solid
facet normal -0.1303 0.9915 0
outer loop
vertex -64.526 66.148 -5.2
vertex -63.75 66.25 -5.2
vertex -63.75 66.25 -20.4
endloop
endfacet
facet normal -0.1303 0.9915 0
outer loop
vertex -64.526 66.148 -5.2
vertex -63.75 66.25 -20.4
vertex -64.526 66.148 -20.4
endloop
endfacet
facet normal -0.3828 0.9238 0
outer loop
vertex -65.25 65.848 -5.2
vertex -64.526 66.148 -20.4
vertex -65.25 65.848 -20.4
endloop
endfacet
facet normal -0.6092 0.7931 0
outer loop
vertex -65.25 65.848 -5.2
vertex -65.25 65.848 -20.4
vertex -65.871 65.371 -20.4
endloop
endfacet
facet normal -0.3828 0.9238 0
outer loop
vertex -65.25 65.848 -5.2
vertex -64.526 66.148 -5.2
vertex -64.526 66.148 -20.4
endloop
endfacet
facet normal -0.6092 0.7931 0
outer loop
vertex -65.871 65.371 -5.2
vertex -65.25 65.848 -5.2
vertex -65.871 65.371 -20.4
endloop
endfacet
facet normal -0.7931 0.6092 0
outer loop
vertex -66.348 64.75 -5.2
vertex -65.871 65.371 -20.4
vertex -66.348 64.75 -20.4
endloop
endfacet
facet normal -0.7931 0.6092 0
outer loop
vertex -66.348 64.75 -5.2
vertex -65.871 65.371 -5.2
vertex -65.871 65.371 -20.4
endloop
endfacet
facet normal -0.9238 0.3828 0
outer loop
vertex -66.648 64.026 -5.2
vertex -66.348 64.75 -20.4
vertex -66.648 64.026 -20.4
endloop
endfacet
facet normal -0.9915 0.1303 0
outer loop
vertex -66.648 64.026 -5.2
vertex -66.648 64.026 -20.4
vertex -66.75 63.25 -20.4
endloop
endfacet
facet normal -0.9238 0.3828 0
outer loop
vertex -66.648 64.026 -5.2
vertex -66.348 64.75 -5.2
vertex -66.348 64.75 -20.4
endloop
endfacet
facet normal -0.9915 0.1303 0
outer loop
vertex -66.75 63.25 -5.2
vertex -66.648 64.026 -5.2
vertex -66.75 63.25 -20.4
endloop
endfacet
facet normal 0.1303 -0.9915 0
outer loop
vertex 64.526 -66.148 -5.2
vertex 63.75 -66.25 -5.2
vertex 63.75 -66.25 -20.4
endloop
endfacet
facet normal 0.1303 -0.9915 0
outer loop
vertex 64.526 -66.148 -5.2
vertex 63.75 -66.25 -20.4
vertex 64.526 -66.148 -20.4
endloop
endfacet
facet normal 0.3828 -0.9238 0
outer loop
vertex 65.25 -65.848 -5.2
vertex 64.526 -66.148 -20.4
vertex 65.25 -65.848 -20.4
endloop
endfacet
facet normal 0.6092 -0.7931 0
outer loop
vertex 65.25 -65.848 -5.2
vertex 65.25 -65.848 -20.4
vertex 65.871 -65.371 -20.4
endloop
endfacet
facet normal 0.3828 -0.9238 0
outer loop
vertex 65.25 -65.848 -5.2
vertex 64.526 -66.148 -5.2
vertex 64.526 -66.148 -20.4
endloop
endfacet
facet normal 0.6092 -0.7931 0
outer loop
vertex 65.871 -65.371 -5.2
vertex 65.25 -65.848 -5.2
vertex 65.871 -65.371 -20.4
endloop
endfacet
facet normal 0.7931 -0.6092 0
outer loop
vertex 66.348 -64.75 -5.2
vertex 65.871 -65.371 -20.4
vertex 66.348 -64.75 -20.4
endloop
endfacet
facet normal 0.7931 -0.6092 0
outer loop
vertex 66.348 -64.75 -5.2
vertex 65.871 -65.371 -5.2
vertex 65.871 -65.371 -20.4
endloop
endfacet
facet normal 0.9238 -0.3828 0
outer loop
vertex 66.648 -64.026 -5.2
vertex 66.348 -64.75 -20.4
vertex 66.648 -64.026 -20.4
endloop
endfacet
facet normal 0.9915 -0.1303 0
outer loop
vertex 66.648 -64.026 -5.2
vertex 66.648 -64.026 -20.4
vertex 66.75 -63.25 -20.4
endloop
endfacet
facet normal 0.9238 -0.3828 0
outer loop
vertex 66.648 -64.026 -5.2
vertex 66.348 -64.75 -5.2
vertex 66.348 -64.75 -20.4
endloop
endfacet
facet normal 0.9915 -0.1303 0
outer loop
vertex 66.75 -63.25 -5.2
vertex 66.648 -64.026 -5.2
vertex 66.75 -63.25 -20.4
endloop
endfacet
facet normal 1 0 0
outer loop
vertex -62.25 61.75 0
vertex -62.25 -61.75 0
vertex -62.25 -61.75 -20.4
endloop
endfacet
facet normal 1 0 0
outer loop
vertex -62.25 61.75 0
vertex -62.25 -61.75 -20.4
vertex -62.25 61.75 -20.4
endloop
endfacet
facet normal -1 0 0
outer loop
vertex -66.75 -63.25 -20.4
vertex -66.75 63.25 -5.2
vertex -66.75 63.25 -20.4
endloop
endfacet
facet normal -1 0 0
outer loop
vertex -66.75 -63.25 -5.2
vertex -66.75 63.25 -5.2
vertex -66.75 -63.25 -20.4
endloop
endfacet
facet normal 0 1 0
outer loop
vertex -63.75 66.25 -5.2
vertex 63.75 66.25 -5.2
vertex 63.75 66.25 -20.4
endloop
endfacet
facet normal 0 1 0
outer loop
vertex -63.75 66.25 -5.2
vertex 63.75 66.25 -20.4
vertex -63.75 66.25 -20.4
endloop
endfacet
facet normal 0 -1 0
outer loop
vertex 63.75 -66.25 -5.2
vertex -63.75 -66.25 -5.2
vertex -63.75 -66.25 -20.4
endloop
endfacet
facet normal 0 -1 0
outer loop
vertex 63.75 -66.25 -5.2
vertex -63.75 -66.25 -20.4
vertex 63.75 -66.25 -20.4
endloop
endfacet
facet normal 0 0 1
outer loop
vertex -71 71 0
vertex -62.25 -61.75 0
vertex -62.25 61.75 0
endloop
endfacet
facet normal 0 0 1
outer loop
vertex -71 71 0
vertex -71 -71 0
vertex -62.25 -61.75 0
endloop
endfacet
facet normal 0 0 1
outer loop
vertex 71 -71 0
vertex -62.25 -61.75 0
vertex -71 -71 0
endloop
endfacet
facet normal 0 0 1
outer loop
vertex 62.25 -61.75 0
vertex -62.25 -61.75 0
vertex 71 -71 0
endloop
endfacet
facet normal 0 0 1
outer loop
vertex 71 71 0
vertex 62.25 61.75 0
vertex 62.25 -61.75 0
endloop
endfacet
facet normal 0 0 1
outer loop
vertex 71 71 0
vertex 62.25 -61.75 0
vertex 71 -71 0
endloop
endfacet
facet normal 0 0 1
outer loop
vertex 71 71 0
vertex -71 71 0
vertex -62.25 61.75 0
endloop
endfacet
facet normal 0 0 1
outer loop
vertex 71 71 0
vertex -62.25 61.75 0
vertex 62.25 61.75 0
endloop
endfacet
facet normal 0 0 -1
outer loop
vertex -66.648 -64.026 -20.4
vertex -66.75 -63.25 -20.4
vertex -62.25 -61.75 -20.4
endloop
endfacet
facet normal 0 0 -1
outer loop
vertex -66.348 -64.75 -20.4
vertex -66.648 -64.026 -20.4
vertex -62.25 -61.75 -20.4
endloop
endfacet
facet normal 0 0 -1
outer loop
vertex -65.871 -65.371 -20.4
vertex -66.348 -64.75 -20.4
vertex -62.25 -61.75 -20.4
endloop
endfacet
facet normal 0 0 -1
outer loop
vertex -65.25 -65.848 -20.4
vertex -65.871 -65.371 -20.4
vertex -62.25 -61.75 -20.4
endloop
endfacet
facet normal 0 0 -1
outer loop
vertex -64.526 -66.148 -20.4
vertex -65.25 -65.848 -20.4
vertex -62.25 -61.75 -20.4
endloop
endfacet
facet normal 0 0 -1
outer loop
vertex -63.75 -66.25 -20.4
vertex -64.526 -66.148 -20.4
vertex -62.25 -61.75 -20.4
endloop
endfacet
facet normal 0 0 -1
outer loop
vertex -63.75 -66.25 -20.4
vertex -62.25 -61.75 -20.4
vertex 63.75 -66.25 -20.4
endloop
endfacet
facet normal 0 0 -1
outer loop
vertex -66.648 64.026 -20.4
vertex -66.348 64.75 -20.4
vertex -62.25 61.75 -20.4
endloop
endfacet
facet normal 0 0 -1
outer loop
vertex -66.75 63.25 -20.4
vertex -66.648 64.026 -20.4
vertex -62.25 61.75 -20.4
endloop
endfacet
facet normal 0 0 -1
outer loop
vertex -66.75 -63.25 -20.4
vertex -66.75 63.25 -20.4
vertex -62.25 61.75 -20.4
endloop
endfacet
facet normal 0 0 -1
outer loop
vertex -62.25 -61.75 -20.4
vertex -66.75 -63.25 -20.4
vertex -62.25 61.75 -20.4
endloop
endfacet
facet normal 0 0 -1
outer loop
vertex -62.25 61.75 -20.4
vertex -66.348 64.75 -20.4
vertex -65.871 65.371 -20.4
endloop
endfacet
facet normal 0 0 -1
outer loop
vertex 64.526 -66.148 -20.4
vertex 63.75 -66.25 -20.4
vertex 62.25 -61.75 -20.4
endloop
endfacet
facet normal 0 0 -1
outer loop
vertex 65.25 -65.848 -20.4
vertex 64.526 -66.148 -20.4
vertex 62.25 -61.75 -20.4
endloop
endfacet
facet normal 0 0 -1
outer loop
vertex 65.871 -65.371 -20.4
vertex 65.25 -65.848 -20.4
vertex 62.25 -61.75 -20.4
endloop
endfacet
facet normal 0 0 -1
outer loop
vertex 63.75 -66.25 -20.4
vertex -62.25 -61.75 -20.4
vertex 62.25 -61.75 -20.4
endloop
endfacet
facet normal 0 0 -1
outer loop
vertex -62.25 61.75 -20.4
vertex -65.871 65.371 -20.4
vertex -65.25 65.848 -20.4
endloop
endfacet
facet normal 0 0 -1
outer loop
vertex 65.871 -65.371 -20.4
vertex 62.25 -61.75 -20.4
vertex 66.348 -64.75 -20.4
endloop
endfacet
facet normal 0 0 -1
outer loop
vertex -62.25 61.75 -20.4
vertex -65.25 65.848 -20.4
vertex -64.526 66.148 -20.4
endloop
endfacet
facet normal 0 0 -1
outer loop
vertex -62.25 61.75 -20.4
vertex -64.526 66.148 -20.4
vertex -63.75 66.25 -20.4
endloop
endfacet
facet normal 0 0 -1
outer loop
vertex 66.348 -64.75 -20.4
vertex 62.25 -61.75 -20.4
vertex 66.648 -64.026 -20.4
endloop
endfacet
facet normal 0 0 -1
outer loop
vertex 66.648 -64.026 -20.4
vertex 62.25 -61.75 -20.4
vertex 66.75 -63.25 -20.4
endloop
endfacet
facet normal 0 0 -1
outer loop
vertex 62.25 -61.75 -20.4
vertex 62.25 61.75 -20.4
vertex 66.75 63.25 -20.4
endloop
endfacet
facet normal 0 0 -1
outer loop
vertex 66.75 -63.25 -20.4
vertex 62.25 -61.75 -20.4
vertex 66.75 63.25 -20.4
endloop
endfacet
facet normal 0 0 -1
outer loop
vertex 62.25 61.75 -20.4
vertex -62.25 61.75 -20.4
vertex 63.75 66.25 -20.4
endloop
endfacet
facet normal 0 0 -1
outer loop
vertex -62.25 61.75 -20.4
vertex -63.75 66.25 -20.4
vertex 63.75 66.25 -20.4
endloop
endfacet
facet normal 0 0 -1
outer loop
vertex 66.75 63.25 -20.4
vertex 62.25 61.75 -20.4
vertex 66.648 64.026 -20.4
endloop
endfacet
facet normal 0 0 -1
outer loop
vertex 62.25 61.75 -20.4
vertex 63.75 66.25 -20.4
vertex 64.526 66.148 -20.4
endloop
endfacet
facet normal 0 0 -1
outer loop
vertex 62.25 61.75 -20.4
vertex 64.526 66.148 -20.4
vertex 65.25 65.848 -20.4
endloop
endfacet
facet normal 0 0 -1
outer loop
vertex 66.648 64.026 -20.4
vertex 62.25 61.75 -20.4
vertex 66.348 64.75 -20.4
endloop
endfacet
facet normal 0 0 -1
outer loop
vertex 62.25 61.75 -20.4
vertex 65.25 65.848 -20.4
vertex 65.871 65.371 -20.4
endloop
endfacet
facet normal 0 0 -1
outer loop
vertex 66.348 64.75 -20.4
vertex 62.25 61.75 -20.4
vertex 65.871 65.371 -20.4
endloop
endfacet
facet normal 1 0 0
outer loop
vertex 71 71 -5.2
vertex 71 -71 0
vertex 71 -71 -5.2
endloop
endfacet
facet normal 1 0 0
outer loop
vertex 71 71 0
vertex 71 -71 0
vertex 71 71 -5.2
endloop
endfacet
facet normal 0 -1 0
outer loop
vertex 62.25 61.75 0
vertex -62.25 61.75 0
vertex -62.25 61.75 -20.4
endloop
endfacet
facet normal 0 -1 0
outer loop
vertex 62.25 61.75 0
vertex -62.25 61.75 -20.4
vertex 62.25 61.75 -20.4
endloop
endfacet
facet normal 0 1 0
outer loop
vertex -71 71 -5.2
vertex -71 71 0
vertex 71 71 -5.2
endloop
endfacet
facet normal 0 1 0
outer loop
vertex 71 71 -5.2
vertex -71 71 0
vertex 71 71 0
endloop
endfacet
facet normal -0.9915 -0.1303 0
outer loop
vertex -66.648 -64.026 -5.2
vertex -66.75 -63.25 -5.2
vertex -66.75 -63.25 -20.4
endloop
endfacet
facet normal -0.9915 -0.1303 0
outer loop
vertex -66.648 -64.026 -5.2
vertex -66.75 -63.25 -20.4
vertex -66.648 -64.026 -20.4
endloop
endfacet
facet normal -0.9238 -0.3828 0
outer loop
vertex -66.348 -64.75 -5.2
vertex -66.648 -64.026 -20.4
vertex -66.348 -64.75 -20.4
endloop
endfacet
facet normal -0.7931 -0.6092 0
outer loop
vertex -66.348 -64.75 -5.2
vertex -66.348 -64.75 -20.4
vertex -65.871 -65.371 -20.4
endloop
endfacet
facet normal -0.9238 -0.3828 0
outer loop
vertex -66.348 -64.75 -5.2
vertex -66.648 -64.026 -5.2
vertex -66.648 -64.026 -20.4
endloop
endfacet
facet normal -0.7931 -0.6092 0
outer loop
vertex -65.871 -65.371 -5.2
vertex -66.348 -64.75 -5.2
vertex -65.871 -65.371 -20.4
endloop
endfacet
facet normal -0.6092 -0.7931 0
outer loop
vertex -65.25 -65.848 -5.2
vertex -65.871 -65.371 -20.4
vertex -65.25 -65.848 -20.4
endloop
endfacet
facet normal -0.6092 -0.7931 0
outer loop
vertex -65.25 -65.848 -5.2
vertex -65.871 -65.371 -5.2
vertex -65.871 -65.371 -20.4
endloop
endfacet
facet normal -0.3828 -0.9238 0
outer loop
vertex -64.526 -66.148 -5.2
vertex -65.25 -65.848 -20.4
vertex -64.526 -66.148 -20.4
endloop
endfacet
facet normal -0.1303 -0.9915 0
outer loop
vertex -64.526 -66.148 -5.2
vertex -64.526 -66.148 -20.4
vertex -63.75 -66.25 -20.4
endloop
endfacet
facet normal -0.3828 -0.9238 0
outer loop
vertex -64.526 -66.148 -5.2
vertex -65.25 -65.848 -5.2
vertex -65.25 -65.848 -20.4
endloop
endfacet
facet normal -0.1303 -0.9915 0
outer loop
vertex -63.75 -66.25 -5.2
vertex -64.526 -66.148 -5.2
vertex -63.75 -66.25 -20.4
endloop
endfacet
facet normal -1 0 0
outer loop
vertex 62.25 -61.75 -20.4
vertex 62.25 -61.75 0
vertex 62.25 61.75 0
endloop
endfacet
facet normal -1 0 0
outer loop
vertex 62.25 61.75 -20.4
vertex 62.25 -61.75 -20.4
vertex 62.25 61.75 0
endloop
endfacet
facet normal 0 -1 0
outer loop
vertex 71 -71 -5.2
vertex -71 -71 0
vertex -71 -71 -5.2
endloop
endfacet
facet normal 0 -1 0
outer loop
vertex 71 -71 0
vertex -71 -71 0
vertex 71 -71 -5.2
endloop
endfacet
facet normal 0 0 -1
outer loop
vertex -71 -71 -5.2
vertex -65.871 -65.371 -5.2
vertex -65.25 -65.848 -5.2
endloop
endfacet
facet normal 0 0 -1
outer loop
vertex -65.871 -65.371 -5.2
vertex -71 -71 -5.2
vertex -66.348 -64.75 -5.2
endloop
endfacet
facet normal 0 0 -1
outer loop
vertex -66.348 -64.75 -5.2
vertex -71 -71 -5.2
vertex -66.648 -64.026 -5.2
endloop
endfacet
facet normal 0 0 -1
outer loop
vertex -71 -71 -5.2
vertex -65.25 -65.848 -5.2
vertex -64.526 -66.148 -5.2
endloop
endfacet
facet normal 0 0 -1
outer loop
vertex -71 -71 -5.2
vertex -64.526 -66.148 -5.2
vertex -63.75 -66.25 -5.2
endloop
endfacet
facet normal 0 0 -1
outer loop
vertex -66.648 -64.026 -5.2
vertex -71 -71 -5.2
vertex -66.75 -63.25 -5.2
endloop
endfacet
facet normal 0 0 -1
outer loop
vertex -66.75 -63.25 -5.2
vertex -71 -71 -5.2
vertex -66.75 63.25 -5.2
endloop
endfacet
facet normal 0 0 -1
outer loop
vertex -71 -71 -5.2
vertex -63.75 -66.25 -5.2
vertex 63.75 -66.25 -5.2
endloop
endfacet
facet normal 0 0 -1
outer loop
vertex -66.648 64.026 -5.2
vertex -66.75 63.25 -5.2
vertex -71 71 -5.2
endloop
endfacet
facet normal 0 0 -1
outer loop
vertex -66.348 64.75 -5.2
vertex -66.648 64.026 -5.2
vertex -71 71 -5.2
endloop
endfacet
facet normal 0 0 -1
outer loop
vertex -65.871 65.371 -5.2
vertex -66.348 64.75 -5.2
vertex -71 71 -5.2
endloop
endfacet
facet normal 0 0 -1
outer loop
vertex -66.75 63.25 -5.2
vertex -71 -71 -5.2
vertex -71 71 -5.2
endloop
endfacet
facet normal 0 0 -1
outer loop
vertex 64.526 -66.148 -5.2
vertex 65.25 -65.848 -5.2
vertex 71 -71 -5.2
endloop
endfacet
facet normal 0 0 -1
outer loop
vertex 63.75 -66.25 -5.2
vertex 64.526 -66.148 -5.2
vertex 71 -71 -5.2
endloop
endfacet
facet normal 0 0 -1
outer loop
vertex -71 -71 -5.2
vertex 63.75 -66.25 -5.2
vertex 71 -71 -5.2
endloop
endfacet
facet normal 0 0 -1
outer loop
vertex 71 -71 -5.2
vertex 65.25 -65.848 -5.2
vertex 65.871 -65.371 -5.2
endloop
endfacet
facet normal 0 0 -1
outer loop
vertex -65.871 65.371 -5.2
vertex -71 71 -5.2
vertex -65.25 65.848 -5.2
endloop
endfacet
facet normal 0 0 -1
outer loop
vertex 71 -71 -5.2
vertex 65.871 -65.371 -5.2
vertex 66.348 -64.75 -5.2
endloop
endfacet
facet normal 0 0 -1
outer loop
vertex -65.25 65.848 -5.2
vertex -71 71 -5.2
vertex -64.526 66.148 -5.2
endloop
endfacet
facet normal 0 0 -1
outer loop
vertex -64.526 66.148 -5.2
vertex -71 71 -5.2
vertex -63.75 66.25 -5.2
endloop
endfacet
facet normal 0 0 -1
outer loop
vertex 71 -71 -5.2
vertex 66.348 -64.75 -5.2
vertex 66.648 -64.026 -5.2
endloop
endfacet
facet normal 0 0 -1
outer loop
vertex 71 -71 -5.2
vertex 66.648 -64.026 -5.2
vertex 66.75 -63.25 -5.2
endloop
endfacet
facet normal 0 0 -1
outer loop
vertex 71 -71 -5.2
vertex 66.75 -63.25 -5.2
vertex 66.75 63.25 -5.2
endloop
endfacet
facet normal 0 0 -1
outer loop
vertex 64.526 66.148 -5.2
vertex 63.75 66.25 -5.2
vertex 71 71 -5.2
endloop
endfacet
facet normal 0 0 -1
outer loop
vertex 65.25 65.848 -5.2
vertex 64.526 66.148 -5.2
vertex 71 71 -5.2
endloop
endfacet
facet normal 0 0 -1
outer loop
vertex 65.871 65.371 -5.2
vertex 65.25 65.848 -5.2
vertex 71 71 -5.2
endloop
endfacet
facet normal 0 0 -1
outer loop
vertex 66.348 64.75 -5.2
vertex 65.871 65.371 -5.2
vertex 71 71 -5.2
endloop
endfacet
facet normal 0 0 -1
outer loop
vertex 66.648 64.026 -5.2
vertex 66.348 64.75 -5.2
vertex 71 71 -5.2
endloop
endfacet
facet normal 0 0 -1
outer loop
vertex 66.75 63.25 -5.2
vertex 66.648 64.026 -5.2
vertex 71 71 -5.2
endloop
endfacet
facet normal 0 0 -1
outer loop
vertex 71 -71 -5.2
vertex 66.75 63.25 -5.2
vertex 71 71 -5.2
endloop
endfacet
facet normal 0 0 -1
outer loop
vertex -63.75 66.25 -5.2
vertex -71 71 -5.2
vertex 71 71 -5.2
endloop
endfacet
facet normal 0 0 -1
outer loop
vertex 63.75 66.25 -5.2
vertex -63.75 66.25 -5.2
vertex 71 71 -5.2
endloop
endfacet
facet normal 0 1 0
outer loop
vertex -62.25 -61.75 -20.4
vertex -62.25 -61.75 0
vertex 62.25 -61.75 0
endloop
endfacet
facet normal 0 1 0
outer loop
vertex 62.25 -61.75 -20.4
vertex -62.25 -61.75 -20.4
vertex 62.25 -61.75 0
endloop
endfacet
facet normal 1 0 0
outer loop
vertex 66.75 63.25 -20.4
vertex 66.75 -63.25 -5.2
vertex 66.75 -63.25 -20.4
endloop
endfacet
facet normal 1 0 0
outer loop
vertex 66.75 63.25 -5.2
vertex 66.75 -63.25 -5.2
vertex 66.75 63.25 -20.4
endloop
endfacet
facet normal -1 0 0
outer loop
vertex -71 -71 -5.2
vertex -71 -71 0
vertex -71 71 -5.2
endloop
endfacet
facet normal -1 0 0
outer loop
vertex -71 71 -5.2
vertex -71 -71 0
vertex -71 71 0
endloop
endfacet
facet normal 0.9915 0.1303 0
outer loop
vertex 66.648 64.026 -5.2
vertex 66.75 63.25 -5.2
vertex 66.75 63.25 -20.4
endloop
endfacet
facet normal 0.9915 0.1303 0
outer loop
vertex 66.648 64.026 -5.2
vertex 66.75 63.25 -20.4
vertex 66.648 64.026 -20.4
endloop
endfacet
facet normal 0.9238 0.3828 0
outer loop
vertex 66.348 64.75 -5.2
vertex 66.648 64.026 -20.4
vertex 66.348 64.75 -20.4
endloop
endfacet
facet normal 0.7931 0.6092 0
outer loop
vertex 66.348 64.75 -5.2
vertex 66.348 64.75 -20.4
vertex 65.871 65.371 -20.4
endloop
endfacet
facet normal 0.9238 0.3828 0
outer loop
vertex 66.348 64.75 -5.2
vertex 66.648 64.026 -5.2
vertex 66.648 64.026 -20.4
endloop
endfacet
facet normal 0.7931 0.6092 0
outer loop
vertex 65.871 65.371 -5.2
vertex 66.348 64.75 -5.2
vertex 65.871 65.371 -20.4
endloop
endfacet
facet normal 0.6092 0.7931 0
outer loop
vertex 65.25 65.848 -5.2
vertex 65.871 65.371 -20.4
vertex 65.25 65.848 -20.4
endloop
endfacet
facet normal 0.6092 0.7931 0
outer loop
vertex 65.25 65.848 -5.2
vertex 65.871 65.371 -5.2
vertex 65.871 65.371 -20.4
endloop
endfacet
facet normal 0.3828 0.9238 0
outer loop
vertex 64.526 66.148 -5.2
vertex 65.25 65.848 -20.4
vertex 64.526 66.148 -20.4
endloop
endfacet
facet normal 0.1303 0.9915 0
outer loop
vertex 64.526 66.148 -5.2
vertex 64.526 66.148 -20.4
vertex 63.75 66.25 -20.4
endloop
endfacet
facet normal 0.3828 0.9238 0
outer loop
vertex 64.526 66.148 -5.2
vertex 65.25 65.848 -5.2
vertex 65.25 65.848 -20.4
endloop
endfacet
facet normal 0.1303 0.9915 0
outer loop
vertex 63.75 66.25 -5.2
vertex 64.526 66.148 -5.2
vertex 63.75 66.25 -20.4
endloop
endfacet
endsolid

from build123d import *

# Parameters (mm, degrees)
F0_W     = 142
F0_H     = 142
F1_DEPTH = 5.2
F0_W_2   = 124.5
F0_H_2   = 123.5
F2_DEPTH = 20.4


with BuildPart() as f1:
    # F0 (on Top) → F1 (new body)
    with BuildSketch(Plane.XY):
        Rectangle(F0_W, F0_H)
        with BuildLine():
            Line((-63.75, 66.25), (63.75, 66.25))
            ThreePointArc((63.75, 66.25), (65.87132, 65.37132), (66.75, 63.25))
            Line((66.75, 63.25), (66.75, -63.25))
            ThreePointArc((66.75, -63.25), (65.87132, -65.37132), (63.75, -66.25))
            Line((63.75, -66.25), (-63.75, -66.25))
            ThreePointArc((-63.75, -66.25), (-65.87132, -65.37132), (-66.75, -63.25))
            Line((-66.75, -63.25), (-66.75, 63.25))
            ThreePointArc((-66.75, 63.25), (-65.87132, 65.37132), (-63.75, 66.25))
        make_face(mode=Mode.SUBTRACT)
    extrude(amount=-F1_DEPTH)

    # F0 (on Top) → F2 (join)
    with BuildSketch(Plane.XY):
        with BuildLine():
            ThreePointArc((66.75, 63.25), (65.87132, 65.37132), (63.75, 66.25))
            Line((63.75, 66.25), (-63.75, 66.25))
            ThreePointArc((-63.75, 66.25), (-65.87132, 65.37132), (-66.75, 63.25))
            Line((-66.75, 63.25), (-66.75, -63.25))
            ThreePointArc((-66.75, -63.25), (-65.87132, -65.37132), (-63.75, -66.25))
            Line((-63.75, -66.25), (63.75, -66.25))
            ThreePointArc((63.75, -66.25), (65.87132, -65.37132), (66.75, -63.25))
            Line((66.75, -63.25), (66.75, 63.25))
        make_face()
        Rectangle(F0_W_2, F0_H_2, mode=Mode.SUBTRACT)
    extrude(amount=-F2_DEPTH)


solid = f1.part
